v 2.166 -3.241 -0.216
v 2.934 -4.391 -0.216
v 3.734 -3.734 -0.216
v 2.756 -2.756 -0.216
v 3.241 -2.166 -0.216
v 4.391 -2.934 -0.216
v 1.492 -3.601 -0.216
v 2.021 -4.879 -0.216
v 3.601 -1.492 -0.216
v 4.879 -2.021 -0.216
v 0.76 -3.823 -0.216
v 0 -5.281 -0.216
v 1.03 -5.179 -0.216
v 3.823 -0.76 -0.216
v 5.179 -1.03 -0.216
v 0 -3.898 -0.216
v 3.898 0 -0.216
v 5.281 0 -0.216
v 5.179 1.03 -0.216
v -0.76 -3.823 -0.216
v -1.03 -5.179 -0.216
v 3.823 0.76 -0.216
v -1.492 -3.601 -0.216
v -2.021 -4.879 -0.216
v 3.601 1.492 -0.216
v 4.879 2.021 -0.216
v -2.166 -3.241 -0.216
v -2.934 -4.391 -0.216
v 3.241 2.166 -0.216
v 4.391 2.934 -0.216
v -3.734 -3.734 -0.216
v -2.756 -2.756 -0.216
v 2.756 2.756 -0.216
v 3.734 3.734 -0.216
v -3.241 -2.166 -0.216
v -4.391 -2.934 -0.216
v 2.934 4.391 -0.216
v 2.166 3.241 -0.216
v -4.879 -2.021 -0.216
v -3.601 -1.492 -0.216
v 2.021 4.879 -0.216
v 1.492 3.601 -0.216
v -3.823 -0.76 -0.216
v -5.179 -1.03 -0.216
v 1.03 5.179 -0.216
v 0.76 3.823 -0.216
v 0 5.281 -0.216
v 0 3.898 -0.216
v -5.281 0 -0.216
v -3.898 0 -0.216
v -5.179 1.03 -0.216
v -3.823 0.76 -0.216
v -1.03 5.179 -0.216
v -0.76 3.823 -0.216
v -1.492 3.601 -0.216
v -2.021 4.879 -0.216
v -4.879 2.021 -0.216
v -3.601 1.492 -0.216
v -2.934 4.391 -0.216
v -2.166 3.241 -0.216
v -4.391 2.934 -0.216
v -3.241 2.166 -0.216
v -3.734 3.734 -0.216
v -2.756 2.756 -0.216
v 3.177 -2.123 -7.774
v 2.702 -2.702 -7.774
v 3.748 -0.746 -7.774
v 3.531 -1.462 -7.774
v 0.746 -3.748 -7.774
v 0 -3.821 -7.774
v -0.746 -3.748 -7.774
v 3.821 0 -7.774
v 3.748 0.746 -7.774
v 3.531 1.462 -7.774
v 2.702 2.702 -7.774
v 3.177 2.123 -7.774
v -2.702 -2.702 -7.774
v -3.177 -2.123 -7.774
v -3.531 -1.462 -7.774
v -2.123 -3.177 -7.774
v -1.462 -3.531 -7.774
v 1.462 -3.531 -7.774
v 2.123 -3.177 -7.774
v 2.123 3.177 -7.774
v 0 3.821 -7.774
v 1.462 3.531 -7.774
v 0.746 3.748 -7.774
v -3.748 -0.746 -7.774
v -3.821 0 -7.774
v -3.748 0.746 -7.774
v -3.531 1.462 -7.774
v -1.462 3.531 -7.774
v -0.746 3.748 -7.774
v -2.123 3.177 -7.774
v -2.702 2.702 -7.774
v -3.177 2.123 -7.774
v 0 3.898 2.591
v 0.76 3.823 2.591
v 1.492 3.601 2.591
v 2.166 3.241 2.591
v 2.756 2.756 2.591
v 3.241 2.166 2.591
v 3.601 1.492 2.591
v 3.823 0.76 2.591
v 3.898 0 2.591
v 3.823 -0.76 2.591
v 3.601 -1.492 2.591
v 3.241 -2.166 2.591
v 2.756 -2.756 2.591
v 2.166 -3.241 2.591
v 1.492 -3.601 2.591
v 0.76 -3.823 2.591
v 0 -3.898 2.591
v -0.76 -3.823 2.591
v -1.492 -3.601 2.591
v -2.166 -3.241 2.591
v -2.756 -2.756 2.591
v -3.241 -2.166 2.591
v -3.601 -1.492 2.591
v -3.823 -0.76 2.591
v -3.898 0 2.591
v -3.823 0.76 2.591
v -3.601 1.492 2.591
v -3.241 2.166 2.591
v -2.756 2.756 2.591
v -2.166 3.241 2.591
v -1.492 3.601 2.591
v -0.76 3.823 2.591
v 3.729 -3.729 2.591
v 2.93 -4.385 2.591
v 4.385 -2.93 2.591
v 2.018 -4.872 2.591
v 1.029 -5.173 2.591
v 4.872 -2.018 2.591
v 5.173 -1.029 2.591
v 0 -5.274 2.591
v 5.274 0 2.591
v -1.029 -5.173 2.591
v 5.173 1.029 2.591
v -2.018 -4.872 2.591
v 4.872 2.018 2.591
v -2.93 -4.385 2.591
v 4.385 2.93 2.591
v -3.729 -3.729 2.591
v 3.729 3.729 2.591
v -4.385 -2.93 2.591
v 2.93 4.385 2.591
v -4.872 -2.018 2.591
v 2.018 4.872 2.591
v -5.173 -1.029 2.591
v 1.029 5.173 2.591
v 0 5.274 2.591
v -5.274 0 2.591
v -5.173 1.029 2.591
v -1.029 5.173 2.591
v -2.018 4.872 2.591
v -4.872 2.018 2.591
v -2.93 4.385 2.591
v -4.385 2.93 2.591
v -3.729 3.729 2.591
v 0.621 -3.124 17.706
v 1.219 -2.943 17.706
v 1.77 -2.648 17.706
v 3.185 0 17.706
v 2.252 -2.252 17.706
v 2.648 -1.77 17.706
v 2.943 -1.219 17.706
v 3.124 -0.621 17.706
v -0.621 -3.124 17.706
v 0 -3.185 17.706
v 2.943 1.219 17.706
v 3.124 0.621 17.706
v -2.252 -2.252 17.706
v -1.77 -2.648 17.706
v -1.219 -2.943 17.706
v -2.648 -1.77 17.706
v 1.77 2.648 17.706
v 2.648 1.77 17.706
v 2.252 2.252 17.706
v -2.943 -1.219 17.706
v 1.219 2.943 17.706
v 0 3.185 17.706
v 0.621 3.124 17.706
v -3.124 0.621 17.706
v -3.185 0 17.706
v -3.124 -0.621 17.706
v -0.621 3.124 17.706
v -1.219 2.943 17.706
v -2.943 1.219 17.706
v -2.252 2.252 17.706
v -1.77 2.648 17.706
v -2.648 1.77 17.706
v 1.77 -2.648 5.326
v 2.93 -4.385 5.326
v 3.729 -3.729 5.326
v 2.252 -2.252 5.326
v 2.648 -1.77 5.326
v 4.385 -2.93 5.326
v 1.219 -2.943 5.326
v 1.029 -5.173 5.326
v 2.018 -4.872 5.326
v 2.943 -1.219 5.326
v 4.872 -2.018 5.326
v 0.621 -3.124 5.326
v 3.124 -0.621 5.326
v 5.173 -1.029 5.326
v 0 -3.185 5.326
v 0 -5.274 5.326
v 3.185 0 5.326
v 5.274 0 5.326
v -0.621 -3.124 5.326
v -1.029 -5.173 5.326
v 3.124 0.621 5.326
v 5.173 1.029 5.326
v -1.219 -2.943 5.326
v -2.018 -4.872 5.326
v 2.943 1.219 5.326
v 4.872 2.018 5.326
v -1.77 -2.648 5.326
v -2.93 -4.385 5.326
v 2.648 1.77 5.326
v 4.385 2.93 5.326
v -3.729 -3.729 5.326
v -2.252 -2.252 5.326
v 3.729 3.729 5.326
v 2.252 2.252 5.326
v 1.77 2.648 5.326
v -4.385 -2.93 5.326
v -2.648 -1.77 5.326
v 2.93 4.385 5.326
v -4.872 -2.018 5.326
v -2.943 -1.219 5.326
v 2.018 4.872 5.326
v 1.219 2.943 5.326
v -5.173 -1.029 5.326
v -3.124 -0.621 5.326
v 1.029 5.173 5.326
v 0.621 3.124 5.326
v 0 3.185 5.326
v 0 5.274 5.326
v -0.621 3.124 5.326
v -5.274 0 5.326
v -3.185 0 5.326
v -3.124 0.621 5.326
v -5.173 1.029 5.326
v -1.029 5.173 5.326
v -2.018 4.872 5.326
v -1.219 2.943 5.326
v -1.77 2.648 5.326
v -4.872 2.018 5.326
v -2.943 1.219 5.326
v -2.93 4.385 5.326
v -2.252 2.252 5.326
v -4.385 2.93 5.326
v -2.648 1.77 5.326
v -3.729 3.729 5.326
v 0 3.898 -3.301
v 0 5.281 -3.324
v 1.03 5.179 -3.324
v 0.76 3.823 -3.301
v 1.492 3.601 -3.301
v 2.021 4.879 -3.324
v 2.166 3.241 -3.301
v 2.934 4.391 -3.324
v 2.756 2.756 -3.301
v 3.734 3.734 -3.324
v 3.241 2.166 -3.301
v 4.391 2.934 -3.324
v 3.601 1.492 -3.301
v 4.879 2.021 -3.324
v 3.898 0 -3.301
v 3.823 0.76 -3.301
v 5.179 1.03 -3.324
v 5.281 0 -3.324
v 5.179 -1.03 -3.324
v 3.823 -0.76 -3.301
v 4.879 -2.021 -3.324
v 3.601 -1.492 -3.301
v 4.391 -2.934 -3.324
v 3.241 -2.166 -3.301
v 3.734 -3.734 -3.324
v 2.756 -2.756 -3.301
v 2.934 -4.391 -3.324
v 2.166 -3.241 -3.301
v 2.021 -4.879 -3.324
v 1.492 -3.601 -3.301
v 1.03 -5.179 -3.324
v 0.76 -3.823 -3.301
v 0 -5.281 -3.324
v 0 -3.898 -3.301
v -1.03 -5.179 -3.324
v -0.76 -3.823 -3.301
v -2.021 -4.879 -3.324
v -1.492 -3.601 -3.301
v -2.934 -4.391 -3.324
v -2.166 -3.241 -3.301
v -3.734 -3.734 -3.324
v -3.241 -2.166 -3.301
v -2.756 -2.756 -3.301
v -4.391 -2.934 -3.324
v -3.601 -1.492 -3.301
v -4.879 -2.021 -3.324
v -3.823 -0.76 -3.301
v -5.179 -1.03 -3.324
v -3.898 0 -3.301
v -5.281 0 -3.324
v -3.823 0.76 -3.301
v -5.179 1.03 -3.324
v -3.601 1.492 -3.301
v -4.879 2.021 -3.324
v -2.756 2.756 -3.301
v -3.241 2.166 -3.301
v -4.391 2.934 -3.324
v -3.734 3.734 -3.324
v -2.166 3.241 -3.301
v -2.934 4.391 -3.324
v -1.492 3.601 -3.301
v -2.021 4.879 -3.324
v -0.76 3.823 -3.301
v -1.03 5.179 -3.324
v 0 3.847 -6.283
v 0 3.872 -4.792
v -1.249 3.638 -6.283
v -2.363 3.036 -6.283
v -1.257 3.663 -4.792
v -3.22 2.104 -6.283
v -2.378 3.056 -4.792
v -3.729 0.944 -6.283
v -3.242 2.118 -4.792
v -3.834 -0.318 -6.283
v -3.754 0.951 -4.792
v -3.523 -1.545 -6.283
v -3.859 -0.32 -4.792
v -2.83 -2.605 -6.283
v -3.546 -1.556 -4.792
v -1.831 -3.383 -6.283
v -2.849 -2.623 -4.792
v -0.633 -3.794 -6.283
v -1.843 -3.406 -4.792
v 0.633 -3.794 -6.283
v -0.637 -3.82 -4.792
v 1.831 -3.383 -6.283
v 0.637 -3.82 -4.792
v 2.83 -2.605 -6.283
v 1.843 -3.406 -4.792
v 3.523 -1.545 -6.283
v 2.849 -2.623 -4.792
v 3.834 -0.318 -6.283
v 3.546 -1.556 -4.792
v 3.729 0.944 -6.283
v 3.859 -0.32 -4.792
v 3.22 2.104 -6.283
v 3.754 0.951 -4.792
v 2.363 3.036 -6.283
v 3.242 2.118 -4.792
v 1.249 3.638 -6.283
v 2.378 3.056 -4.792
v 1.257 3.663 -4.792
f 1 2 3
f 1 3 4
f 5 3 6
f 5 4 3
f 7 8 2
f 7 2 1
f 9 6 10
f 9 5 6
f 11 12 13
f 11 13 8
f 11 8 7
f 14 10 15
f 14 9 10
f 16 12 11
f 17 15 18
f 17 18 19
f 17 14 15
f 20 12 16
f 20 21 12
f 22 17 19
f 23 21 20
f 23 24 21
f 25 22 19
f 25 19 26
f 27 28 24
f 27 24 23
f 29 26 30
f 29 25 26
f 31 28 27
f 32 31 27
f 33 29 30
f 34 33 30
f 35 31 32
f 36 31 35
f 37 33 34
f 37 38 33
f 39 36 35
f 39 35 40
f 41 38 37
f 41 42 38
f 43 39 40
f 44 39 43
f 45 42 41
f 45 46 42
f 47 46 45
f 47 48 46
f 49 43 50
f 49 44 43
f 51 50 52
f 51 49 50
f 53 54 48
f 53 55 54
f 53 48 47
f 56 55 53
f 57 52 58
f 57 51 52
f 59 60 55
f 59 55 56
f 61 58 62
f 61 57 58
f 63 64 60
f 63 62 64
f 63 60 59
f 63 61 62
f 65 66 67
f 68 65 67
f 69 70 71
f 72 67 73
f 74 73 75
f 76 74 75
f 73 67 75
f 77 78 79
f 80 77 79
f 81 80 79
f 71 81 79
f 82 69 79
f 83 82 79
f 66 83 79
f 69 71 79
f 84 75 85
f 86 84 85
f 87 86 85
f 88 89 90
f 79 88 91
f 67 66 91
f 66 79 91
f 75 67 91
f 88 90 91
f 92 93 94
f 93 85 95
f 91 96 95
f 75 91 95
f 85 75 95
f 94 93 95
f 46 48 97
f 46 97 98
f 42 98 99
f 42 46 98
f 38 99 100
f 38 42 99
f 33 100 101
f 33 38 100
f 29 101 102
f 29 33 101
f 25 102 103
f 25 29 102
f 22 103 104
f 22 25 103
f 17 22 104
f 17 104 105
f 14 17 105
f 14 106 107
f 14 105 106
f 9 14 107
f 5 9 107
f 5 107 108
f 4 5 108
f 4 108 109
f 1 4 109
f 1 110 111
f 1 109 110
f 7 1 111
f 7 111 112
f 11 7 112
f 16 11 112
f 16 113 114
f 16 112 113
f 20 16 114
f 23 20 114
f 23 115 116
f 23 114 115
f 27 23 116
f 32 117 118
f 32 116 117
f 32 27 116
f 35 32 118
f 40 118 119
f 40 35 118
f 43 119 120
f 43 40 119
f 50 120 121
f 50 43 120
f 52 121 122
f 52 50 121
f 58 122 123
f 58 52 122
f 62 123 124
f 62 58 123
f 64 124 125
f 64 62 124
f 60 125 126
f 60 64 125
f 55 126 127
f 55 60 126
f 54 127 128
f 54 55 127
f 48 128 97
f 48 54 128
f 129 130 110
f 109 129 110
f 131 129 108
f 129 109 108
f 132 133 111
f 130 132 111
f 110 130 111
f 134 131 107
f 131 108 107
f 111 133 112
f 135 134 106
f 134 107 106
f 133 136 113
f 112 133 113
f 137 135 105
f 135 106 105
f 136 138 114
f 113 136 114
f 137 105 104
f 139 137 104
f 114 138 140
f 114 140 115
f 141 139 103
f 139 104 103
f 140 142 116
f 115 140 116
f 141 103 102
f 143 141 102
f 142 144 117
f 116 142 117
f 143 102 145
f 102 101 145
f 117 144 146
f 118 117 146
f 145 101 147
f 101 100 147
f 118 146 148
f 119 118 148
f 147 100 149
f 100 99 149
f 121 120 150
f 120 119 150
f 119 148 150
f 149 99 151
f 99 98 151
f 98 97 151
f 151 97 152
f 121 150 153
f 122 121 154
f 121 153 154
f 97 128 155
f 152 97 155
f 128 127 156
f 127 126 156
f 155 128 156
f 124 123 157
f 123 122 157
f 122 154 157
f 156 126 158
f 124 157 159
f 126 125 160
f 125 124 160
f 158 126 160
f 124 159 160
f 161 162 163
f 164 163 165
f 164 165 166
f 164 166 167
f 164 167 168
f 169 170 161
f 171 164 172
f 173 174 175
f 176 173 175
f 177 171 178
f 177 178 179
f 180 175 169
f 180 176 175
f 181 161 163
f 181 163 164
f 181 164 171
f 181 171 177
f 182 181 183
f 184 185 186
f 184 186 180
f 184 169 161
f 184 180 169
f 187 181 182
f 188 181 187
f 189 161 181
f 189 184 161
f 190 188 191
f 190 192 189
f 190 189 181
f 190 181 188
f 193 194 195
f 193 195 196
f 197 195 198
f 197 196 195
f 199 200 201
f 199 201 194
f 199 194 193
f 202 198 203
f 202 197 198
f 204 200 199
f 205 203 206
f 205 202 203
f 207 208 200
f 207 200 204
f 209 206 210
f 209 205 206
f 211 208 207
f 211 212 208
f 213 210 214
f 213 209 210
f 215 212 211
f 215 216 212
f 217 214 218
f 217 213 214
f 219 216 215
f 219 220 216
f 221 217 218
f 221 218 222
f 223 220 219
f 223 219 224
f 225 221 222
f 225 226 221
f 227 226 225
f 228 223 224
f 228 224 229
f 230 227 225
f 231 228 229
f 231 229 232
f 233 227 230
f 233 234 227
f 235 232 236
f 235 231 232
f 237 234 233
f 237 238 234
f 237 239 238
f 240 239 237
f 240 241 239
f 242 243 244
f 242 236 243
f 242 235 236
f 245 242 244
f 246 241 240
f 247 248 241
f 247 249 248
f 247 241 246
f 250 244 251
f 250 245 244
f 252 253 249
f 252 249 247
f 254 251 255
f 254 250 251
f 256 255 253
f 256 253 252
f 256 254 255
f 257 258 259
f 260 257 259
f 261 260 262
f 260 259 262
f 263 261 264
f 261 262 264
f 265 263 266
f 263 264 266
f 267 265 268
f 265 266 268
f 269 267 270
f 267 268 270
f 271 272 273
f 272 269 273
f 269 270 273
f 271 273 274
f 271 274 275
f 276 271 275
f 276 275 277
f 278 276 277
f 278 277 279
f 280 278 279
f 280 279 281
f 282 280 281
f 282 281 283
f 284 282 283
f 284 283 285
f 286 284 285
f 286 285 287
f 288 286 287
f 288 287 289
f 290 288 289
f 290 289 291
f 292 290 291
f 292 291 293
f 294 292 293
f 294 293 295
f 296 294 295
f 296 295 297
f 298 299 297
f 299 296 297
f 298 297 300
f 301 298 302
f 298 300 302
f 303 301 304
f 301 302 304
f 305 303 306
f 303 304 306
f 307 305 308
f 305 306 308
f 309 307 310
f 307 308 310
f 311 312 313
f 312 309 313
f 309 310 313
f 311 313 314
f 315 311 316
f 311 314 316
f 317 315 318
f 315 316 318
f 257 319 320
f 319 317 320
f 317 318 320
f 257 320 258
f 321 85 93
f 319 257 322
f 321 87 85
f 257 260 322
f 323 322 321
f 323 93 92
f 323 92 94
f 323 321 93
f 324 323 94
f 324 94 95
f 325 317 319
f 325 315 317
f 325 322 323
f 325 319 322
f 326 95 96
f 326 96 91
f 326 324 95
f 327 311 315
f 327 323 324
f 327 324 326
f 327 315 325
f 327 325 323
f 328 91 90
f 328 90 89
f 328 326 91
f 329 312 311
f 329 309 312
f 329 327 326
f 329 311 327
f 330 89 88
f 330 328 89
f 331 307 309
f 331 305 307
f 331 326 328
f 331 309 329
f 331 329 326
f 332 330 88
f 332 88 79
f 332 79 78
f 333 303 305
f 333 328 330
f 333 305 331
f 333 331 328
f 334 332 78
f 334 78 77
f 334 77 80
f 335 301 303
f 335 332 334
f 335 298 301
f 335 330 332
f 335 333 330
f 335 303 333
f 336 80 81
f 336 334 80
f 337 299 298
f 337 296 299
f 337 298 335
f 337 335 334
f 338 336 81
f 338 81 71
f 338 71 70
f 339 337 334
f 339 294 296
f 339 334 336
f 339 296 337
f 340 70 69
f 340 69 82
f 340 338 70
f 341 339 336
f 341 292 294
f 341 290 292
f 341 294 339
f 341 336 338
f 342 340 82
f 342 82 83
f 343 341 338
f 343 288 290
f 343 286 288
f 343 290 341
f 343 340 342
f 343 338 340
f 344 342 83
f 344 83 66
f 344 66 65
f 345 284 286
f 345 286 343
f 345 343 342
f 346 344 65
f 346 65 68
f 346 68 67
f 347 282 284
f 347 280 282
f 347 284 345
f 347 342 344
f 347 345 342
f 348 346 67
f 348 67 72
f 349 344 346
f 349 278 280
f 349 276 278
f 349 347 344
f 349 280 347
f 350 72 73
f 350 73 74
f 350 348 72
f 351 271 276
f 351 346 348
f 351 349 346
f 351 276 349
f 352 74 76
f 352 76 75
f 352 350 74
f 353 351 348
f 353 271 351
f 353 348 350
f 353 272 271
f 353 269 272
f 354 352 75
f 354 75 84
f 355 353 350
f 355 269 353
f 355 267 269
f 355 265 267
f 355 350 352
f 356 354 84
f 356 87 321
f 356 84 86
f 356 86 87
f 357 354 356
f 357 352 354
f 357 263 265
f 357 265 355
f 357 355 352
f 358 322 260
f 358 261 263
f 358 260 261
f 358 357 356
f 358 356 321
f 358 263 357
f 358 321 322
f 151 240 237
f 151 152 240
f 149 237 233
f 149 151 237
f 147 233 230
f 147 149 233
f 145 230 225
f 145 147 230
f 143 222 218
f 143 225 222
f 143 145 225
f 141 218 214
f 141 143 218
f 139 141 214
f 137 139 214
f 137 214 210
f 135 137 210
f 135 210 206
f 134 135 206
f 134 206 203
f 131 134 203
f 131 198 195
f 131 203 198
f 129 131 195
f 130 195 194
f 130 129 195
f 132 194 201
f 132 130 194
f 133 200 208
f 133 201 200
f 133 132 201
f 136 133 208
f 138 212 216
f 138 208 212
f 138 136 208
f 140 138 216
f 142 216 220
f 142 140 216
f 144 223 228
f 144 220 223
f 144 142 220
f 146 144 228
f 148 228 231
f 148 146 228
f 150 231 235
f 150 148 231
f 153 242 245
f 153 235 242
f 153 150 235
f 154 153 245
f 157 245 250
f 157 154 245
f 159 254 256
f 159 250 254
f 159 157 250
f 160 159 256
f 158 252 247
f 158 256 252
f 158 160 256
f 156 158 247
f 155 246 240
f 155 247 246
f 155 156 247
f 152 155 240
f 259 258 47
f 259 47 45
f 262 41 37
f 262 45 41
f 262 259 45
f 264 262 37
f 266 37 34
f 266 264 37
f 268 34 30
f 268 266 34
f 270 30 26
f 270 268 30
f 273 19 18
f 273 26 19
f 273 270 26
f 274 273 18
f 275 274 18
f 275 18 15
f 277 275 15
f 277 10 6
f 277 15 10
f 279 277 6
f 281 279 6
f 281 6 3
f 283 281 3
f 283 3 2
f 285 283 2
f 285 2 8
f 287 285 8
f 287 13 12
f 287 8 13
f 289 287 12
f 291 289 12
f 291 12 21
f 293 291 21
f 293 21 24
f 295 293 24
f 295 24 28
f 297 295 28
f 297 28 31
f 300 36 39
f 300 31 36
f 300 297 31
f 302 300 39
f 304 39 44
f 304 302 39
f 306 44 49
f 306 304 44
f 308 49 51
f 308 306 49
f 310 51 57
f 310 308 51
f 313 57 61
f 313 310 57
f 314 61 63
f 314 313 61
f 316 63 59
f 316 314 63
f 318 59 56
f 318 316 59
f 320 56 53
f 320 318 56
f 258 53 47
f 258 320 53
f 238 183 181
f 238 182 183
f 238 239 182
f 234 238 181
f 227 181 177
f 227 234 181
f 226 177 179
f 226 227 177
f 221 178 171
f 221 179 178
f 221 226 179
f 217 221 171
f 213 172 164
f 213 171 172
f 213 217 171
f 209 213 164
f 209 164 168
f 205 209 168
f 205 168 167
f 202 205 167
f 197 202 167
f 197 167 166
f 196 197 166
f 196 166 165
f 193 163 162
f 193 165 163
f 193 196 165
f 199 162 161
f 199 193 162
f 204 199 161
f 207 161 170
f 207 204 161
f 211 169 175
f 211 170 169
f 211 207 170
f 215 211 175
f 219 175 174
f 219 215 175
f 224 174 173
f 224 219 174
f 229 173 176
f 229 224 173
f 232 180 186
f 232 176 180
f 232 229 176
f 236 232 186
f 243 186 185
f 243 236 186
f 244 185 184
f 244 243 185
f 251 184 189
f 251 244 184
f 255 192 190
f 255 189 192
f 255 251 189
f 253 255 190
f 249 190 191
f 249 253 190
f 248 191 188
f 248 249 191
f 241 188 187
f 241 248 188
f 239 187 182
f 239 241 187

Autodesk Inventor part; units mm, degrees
ref_plane "YZ Plane" through (0, 0, 0) normal (1, 0, 0) x (0, 1, 0)
ref_plane "XZ Plane" through (0, 0, 0) normal (0, 1, 0) x (-1, 0, 0)
ref_plane "XY Plane" through (0, 0, 0) normal (0, 0, 1) x (1, 0, 0)
sketch "Sketch1" plane through (0, 0, 0) normal (1, 0, 0) x (0, 1, 0)
  line L0 (0, 17.706) -> (3.1851, 17.706)
  line L1 (3.1851, 17.706) -> (3.1851, 5.3262)
  line L2 (3.1851, 5.3262) -> (5.2739, 5.3262)
  line L3 (5.2739, 5.3262) -> (5.2739, 2.5911)
  line L4 (5.2739, 2.5911) -> (3.8979, 2.5911)
  line L5 (3.8979, 2.5911) -> (3.8979, -0.2159)
  line L6 (3.8979, -0.2159) -> (5.2809, -0.2159)
  line L7 (5.2809, -0.2159) -> (5.2809, -3.3244)
  line L8 (5.2809, -3.3244) -> (3.8979, -3.3008)
  line L9 (3.8979, -3.3008) -> (3.8214, -7.7742)
  line L10 (3.8214, -7.7742) -> (0, -7.7742)
  line L11 (0, -7.7742) -> (0, 17.706)
  point P0 (0, 0)
revolve "Revolution1" add sketch "Sketch1" angle 360 about axis through (0, 0, -7.7742) along (0, 0, 1)
properties part number "simple_shaft"
